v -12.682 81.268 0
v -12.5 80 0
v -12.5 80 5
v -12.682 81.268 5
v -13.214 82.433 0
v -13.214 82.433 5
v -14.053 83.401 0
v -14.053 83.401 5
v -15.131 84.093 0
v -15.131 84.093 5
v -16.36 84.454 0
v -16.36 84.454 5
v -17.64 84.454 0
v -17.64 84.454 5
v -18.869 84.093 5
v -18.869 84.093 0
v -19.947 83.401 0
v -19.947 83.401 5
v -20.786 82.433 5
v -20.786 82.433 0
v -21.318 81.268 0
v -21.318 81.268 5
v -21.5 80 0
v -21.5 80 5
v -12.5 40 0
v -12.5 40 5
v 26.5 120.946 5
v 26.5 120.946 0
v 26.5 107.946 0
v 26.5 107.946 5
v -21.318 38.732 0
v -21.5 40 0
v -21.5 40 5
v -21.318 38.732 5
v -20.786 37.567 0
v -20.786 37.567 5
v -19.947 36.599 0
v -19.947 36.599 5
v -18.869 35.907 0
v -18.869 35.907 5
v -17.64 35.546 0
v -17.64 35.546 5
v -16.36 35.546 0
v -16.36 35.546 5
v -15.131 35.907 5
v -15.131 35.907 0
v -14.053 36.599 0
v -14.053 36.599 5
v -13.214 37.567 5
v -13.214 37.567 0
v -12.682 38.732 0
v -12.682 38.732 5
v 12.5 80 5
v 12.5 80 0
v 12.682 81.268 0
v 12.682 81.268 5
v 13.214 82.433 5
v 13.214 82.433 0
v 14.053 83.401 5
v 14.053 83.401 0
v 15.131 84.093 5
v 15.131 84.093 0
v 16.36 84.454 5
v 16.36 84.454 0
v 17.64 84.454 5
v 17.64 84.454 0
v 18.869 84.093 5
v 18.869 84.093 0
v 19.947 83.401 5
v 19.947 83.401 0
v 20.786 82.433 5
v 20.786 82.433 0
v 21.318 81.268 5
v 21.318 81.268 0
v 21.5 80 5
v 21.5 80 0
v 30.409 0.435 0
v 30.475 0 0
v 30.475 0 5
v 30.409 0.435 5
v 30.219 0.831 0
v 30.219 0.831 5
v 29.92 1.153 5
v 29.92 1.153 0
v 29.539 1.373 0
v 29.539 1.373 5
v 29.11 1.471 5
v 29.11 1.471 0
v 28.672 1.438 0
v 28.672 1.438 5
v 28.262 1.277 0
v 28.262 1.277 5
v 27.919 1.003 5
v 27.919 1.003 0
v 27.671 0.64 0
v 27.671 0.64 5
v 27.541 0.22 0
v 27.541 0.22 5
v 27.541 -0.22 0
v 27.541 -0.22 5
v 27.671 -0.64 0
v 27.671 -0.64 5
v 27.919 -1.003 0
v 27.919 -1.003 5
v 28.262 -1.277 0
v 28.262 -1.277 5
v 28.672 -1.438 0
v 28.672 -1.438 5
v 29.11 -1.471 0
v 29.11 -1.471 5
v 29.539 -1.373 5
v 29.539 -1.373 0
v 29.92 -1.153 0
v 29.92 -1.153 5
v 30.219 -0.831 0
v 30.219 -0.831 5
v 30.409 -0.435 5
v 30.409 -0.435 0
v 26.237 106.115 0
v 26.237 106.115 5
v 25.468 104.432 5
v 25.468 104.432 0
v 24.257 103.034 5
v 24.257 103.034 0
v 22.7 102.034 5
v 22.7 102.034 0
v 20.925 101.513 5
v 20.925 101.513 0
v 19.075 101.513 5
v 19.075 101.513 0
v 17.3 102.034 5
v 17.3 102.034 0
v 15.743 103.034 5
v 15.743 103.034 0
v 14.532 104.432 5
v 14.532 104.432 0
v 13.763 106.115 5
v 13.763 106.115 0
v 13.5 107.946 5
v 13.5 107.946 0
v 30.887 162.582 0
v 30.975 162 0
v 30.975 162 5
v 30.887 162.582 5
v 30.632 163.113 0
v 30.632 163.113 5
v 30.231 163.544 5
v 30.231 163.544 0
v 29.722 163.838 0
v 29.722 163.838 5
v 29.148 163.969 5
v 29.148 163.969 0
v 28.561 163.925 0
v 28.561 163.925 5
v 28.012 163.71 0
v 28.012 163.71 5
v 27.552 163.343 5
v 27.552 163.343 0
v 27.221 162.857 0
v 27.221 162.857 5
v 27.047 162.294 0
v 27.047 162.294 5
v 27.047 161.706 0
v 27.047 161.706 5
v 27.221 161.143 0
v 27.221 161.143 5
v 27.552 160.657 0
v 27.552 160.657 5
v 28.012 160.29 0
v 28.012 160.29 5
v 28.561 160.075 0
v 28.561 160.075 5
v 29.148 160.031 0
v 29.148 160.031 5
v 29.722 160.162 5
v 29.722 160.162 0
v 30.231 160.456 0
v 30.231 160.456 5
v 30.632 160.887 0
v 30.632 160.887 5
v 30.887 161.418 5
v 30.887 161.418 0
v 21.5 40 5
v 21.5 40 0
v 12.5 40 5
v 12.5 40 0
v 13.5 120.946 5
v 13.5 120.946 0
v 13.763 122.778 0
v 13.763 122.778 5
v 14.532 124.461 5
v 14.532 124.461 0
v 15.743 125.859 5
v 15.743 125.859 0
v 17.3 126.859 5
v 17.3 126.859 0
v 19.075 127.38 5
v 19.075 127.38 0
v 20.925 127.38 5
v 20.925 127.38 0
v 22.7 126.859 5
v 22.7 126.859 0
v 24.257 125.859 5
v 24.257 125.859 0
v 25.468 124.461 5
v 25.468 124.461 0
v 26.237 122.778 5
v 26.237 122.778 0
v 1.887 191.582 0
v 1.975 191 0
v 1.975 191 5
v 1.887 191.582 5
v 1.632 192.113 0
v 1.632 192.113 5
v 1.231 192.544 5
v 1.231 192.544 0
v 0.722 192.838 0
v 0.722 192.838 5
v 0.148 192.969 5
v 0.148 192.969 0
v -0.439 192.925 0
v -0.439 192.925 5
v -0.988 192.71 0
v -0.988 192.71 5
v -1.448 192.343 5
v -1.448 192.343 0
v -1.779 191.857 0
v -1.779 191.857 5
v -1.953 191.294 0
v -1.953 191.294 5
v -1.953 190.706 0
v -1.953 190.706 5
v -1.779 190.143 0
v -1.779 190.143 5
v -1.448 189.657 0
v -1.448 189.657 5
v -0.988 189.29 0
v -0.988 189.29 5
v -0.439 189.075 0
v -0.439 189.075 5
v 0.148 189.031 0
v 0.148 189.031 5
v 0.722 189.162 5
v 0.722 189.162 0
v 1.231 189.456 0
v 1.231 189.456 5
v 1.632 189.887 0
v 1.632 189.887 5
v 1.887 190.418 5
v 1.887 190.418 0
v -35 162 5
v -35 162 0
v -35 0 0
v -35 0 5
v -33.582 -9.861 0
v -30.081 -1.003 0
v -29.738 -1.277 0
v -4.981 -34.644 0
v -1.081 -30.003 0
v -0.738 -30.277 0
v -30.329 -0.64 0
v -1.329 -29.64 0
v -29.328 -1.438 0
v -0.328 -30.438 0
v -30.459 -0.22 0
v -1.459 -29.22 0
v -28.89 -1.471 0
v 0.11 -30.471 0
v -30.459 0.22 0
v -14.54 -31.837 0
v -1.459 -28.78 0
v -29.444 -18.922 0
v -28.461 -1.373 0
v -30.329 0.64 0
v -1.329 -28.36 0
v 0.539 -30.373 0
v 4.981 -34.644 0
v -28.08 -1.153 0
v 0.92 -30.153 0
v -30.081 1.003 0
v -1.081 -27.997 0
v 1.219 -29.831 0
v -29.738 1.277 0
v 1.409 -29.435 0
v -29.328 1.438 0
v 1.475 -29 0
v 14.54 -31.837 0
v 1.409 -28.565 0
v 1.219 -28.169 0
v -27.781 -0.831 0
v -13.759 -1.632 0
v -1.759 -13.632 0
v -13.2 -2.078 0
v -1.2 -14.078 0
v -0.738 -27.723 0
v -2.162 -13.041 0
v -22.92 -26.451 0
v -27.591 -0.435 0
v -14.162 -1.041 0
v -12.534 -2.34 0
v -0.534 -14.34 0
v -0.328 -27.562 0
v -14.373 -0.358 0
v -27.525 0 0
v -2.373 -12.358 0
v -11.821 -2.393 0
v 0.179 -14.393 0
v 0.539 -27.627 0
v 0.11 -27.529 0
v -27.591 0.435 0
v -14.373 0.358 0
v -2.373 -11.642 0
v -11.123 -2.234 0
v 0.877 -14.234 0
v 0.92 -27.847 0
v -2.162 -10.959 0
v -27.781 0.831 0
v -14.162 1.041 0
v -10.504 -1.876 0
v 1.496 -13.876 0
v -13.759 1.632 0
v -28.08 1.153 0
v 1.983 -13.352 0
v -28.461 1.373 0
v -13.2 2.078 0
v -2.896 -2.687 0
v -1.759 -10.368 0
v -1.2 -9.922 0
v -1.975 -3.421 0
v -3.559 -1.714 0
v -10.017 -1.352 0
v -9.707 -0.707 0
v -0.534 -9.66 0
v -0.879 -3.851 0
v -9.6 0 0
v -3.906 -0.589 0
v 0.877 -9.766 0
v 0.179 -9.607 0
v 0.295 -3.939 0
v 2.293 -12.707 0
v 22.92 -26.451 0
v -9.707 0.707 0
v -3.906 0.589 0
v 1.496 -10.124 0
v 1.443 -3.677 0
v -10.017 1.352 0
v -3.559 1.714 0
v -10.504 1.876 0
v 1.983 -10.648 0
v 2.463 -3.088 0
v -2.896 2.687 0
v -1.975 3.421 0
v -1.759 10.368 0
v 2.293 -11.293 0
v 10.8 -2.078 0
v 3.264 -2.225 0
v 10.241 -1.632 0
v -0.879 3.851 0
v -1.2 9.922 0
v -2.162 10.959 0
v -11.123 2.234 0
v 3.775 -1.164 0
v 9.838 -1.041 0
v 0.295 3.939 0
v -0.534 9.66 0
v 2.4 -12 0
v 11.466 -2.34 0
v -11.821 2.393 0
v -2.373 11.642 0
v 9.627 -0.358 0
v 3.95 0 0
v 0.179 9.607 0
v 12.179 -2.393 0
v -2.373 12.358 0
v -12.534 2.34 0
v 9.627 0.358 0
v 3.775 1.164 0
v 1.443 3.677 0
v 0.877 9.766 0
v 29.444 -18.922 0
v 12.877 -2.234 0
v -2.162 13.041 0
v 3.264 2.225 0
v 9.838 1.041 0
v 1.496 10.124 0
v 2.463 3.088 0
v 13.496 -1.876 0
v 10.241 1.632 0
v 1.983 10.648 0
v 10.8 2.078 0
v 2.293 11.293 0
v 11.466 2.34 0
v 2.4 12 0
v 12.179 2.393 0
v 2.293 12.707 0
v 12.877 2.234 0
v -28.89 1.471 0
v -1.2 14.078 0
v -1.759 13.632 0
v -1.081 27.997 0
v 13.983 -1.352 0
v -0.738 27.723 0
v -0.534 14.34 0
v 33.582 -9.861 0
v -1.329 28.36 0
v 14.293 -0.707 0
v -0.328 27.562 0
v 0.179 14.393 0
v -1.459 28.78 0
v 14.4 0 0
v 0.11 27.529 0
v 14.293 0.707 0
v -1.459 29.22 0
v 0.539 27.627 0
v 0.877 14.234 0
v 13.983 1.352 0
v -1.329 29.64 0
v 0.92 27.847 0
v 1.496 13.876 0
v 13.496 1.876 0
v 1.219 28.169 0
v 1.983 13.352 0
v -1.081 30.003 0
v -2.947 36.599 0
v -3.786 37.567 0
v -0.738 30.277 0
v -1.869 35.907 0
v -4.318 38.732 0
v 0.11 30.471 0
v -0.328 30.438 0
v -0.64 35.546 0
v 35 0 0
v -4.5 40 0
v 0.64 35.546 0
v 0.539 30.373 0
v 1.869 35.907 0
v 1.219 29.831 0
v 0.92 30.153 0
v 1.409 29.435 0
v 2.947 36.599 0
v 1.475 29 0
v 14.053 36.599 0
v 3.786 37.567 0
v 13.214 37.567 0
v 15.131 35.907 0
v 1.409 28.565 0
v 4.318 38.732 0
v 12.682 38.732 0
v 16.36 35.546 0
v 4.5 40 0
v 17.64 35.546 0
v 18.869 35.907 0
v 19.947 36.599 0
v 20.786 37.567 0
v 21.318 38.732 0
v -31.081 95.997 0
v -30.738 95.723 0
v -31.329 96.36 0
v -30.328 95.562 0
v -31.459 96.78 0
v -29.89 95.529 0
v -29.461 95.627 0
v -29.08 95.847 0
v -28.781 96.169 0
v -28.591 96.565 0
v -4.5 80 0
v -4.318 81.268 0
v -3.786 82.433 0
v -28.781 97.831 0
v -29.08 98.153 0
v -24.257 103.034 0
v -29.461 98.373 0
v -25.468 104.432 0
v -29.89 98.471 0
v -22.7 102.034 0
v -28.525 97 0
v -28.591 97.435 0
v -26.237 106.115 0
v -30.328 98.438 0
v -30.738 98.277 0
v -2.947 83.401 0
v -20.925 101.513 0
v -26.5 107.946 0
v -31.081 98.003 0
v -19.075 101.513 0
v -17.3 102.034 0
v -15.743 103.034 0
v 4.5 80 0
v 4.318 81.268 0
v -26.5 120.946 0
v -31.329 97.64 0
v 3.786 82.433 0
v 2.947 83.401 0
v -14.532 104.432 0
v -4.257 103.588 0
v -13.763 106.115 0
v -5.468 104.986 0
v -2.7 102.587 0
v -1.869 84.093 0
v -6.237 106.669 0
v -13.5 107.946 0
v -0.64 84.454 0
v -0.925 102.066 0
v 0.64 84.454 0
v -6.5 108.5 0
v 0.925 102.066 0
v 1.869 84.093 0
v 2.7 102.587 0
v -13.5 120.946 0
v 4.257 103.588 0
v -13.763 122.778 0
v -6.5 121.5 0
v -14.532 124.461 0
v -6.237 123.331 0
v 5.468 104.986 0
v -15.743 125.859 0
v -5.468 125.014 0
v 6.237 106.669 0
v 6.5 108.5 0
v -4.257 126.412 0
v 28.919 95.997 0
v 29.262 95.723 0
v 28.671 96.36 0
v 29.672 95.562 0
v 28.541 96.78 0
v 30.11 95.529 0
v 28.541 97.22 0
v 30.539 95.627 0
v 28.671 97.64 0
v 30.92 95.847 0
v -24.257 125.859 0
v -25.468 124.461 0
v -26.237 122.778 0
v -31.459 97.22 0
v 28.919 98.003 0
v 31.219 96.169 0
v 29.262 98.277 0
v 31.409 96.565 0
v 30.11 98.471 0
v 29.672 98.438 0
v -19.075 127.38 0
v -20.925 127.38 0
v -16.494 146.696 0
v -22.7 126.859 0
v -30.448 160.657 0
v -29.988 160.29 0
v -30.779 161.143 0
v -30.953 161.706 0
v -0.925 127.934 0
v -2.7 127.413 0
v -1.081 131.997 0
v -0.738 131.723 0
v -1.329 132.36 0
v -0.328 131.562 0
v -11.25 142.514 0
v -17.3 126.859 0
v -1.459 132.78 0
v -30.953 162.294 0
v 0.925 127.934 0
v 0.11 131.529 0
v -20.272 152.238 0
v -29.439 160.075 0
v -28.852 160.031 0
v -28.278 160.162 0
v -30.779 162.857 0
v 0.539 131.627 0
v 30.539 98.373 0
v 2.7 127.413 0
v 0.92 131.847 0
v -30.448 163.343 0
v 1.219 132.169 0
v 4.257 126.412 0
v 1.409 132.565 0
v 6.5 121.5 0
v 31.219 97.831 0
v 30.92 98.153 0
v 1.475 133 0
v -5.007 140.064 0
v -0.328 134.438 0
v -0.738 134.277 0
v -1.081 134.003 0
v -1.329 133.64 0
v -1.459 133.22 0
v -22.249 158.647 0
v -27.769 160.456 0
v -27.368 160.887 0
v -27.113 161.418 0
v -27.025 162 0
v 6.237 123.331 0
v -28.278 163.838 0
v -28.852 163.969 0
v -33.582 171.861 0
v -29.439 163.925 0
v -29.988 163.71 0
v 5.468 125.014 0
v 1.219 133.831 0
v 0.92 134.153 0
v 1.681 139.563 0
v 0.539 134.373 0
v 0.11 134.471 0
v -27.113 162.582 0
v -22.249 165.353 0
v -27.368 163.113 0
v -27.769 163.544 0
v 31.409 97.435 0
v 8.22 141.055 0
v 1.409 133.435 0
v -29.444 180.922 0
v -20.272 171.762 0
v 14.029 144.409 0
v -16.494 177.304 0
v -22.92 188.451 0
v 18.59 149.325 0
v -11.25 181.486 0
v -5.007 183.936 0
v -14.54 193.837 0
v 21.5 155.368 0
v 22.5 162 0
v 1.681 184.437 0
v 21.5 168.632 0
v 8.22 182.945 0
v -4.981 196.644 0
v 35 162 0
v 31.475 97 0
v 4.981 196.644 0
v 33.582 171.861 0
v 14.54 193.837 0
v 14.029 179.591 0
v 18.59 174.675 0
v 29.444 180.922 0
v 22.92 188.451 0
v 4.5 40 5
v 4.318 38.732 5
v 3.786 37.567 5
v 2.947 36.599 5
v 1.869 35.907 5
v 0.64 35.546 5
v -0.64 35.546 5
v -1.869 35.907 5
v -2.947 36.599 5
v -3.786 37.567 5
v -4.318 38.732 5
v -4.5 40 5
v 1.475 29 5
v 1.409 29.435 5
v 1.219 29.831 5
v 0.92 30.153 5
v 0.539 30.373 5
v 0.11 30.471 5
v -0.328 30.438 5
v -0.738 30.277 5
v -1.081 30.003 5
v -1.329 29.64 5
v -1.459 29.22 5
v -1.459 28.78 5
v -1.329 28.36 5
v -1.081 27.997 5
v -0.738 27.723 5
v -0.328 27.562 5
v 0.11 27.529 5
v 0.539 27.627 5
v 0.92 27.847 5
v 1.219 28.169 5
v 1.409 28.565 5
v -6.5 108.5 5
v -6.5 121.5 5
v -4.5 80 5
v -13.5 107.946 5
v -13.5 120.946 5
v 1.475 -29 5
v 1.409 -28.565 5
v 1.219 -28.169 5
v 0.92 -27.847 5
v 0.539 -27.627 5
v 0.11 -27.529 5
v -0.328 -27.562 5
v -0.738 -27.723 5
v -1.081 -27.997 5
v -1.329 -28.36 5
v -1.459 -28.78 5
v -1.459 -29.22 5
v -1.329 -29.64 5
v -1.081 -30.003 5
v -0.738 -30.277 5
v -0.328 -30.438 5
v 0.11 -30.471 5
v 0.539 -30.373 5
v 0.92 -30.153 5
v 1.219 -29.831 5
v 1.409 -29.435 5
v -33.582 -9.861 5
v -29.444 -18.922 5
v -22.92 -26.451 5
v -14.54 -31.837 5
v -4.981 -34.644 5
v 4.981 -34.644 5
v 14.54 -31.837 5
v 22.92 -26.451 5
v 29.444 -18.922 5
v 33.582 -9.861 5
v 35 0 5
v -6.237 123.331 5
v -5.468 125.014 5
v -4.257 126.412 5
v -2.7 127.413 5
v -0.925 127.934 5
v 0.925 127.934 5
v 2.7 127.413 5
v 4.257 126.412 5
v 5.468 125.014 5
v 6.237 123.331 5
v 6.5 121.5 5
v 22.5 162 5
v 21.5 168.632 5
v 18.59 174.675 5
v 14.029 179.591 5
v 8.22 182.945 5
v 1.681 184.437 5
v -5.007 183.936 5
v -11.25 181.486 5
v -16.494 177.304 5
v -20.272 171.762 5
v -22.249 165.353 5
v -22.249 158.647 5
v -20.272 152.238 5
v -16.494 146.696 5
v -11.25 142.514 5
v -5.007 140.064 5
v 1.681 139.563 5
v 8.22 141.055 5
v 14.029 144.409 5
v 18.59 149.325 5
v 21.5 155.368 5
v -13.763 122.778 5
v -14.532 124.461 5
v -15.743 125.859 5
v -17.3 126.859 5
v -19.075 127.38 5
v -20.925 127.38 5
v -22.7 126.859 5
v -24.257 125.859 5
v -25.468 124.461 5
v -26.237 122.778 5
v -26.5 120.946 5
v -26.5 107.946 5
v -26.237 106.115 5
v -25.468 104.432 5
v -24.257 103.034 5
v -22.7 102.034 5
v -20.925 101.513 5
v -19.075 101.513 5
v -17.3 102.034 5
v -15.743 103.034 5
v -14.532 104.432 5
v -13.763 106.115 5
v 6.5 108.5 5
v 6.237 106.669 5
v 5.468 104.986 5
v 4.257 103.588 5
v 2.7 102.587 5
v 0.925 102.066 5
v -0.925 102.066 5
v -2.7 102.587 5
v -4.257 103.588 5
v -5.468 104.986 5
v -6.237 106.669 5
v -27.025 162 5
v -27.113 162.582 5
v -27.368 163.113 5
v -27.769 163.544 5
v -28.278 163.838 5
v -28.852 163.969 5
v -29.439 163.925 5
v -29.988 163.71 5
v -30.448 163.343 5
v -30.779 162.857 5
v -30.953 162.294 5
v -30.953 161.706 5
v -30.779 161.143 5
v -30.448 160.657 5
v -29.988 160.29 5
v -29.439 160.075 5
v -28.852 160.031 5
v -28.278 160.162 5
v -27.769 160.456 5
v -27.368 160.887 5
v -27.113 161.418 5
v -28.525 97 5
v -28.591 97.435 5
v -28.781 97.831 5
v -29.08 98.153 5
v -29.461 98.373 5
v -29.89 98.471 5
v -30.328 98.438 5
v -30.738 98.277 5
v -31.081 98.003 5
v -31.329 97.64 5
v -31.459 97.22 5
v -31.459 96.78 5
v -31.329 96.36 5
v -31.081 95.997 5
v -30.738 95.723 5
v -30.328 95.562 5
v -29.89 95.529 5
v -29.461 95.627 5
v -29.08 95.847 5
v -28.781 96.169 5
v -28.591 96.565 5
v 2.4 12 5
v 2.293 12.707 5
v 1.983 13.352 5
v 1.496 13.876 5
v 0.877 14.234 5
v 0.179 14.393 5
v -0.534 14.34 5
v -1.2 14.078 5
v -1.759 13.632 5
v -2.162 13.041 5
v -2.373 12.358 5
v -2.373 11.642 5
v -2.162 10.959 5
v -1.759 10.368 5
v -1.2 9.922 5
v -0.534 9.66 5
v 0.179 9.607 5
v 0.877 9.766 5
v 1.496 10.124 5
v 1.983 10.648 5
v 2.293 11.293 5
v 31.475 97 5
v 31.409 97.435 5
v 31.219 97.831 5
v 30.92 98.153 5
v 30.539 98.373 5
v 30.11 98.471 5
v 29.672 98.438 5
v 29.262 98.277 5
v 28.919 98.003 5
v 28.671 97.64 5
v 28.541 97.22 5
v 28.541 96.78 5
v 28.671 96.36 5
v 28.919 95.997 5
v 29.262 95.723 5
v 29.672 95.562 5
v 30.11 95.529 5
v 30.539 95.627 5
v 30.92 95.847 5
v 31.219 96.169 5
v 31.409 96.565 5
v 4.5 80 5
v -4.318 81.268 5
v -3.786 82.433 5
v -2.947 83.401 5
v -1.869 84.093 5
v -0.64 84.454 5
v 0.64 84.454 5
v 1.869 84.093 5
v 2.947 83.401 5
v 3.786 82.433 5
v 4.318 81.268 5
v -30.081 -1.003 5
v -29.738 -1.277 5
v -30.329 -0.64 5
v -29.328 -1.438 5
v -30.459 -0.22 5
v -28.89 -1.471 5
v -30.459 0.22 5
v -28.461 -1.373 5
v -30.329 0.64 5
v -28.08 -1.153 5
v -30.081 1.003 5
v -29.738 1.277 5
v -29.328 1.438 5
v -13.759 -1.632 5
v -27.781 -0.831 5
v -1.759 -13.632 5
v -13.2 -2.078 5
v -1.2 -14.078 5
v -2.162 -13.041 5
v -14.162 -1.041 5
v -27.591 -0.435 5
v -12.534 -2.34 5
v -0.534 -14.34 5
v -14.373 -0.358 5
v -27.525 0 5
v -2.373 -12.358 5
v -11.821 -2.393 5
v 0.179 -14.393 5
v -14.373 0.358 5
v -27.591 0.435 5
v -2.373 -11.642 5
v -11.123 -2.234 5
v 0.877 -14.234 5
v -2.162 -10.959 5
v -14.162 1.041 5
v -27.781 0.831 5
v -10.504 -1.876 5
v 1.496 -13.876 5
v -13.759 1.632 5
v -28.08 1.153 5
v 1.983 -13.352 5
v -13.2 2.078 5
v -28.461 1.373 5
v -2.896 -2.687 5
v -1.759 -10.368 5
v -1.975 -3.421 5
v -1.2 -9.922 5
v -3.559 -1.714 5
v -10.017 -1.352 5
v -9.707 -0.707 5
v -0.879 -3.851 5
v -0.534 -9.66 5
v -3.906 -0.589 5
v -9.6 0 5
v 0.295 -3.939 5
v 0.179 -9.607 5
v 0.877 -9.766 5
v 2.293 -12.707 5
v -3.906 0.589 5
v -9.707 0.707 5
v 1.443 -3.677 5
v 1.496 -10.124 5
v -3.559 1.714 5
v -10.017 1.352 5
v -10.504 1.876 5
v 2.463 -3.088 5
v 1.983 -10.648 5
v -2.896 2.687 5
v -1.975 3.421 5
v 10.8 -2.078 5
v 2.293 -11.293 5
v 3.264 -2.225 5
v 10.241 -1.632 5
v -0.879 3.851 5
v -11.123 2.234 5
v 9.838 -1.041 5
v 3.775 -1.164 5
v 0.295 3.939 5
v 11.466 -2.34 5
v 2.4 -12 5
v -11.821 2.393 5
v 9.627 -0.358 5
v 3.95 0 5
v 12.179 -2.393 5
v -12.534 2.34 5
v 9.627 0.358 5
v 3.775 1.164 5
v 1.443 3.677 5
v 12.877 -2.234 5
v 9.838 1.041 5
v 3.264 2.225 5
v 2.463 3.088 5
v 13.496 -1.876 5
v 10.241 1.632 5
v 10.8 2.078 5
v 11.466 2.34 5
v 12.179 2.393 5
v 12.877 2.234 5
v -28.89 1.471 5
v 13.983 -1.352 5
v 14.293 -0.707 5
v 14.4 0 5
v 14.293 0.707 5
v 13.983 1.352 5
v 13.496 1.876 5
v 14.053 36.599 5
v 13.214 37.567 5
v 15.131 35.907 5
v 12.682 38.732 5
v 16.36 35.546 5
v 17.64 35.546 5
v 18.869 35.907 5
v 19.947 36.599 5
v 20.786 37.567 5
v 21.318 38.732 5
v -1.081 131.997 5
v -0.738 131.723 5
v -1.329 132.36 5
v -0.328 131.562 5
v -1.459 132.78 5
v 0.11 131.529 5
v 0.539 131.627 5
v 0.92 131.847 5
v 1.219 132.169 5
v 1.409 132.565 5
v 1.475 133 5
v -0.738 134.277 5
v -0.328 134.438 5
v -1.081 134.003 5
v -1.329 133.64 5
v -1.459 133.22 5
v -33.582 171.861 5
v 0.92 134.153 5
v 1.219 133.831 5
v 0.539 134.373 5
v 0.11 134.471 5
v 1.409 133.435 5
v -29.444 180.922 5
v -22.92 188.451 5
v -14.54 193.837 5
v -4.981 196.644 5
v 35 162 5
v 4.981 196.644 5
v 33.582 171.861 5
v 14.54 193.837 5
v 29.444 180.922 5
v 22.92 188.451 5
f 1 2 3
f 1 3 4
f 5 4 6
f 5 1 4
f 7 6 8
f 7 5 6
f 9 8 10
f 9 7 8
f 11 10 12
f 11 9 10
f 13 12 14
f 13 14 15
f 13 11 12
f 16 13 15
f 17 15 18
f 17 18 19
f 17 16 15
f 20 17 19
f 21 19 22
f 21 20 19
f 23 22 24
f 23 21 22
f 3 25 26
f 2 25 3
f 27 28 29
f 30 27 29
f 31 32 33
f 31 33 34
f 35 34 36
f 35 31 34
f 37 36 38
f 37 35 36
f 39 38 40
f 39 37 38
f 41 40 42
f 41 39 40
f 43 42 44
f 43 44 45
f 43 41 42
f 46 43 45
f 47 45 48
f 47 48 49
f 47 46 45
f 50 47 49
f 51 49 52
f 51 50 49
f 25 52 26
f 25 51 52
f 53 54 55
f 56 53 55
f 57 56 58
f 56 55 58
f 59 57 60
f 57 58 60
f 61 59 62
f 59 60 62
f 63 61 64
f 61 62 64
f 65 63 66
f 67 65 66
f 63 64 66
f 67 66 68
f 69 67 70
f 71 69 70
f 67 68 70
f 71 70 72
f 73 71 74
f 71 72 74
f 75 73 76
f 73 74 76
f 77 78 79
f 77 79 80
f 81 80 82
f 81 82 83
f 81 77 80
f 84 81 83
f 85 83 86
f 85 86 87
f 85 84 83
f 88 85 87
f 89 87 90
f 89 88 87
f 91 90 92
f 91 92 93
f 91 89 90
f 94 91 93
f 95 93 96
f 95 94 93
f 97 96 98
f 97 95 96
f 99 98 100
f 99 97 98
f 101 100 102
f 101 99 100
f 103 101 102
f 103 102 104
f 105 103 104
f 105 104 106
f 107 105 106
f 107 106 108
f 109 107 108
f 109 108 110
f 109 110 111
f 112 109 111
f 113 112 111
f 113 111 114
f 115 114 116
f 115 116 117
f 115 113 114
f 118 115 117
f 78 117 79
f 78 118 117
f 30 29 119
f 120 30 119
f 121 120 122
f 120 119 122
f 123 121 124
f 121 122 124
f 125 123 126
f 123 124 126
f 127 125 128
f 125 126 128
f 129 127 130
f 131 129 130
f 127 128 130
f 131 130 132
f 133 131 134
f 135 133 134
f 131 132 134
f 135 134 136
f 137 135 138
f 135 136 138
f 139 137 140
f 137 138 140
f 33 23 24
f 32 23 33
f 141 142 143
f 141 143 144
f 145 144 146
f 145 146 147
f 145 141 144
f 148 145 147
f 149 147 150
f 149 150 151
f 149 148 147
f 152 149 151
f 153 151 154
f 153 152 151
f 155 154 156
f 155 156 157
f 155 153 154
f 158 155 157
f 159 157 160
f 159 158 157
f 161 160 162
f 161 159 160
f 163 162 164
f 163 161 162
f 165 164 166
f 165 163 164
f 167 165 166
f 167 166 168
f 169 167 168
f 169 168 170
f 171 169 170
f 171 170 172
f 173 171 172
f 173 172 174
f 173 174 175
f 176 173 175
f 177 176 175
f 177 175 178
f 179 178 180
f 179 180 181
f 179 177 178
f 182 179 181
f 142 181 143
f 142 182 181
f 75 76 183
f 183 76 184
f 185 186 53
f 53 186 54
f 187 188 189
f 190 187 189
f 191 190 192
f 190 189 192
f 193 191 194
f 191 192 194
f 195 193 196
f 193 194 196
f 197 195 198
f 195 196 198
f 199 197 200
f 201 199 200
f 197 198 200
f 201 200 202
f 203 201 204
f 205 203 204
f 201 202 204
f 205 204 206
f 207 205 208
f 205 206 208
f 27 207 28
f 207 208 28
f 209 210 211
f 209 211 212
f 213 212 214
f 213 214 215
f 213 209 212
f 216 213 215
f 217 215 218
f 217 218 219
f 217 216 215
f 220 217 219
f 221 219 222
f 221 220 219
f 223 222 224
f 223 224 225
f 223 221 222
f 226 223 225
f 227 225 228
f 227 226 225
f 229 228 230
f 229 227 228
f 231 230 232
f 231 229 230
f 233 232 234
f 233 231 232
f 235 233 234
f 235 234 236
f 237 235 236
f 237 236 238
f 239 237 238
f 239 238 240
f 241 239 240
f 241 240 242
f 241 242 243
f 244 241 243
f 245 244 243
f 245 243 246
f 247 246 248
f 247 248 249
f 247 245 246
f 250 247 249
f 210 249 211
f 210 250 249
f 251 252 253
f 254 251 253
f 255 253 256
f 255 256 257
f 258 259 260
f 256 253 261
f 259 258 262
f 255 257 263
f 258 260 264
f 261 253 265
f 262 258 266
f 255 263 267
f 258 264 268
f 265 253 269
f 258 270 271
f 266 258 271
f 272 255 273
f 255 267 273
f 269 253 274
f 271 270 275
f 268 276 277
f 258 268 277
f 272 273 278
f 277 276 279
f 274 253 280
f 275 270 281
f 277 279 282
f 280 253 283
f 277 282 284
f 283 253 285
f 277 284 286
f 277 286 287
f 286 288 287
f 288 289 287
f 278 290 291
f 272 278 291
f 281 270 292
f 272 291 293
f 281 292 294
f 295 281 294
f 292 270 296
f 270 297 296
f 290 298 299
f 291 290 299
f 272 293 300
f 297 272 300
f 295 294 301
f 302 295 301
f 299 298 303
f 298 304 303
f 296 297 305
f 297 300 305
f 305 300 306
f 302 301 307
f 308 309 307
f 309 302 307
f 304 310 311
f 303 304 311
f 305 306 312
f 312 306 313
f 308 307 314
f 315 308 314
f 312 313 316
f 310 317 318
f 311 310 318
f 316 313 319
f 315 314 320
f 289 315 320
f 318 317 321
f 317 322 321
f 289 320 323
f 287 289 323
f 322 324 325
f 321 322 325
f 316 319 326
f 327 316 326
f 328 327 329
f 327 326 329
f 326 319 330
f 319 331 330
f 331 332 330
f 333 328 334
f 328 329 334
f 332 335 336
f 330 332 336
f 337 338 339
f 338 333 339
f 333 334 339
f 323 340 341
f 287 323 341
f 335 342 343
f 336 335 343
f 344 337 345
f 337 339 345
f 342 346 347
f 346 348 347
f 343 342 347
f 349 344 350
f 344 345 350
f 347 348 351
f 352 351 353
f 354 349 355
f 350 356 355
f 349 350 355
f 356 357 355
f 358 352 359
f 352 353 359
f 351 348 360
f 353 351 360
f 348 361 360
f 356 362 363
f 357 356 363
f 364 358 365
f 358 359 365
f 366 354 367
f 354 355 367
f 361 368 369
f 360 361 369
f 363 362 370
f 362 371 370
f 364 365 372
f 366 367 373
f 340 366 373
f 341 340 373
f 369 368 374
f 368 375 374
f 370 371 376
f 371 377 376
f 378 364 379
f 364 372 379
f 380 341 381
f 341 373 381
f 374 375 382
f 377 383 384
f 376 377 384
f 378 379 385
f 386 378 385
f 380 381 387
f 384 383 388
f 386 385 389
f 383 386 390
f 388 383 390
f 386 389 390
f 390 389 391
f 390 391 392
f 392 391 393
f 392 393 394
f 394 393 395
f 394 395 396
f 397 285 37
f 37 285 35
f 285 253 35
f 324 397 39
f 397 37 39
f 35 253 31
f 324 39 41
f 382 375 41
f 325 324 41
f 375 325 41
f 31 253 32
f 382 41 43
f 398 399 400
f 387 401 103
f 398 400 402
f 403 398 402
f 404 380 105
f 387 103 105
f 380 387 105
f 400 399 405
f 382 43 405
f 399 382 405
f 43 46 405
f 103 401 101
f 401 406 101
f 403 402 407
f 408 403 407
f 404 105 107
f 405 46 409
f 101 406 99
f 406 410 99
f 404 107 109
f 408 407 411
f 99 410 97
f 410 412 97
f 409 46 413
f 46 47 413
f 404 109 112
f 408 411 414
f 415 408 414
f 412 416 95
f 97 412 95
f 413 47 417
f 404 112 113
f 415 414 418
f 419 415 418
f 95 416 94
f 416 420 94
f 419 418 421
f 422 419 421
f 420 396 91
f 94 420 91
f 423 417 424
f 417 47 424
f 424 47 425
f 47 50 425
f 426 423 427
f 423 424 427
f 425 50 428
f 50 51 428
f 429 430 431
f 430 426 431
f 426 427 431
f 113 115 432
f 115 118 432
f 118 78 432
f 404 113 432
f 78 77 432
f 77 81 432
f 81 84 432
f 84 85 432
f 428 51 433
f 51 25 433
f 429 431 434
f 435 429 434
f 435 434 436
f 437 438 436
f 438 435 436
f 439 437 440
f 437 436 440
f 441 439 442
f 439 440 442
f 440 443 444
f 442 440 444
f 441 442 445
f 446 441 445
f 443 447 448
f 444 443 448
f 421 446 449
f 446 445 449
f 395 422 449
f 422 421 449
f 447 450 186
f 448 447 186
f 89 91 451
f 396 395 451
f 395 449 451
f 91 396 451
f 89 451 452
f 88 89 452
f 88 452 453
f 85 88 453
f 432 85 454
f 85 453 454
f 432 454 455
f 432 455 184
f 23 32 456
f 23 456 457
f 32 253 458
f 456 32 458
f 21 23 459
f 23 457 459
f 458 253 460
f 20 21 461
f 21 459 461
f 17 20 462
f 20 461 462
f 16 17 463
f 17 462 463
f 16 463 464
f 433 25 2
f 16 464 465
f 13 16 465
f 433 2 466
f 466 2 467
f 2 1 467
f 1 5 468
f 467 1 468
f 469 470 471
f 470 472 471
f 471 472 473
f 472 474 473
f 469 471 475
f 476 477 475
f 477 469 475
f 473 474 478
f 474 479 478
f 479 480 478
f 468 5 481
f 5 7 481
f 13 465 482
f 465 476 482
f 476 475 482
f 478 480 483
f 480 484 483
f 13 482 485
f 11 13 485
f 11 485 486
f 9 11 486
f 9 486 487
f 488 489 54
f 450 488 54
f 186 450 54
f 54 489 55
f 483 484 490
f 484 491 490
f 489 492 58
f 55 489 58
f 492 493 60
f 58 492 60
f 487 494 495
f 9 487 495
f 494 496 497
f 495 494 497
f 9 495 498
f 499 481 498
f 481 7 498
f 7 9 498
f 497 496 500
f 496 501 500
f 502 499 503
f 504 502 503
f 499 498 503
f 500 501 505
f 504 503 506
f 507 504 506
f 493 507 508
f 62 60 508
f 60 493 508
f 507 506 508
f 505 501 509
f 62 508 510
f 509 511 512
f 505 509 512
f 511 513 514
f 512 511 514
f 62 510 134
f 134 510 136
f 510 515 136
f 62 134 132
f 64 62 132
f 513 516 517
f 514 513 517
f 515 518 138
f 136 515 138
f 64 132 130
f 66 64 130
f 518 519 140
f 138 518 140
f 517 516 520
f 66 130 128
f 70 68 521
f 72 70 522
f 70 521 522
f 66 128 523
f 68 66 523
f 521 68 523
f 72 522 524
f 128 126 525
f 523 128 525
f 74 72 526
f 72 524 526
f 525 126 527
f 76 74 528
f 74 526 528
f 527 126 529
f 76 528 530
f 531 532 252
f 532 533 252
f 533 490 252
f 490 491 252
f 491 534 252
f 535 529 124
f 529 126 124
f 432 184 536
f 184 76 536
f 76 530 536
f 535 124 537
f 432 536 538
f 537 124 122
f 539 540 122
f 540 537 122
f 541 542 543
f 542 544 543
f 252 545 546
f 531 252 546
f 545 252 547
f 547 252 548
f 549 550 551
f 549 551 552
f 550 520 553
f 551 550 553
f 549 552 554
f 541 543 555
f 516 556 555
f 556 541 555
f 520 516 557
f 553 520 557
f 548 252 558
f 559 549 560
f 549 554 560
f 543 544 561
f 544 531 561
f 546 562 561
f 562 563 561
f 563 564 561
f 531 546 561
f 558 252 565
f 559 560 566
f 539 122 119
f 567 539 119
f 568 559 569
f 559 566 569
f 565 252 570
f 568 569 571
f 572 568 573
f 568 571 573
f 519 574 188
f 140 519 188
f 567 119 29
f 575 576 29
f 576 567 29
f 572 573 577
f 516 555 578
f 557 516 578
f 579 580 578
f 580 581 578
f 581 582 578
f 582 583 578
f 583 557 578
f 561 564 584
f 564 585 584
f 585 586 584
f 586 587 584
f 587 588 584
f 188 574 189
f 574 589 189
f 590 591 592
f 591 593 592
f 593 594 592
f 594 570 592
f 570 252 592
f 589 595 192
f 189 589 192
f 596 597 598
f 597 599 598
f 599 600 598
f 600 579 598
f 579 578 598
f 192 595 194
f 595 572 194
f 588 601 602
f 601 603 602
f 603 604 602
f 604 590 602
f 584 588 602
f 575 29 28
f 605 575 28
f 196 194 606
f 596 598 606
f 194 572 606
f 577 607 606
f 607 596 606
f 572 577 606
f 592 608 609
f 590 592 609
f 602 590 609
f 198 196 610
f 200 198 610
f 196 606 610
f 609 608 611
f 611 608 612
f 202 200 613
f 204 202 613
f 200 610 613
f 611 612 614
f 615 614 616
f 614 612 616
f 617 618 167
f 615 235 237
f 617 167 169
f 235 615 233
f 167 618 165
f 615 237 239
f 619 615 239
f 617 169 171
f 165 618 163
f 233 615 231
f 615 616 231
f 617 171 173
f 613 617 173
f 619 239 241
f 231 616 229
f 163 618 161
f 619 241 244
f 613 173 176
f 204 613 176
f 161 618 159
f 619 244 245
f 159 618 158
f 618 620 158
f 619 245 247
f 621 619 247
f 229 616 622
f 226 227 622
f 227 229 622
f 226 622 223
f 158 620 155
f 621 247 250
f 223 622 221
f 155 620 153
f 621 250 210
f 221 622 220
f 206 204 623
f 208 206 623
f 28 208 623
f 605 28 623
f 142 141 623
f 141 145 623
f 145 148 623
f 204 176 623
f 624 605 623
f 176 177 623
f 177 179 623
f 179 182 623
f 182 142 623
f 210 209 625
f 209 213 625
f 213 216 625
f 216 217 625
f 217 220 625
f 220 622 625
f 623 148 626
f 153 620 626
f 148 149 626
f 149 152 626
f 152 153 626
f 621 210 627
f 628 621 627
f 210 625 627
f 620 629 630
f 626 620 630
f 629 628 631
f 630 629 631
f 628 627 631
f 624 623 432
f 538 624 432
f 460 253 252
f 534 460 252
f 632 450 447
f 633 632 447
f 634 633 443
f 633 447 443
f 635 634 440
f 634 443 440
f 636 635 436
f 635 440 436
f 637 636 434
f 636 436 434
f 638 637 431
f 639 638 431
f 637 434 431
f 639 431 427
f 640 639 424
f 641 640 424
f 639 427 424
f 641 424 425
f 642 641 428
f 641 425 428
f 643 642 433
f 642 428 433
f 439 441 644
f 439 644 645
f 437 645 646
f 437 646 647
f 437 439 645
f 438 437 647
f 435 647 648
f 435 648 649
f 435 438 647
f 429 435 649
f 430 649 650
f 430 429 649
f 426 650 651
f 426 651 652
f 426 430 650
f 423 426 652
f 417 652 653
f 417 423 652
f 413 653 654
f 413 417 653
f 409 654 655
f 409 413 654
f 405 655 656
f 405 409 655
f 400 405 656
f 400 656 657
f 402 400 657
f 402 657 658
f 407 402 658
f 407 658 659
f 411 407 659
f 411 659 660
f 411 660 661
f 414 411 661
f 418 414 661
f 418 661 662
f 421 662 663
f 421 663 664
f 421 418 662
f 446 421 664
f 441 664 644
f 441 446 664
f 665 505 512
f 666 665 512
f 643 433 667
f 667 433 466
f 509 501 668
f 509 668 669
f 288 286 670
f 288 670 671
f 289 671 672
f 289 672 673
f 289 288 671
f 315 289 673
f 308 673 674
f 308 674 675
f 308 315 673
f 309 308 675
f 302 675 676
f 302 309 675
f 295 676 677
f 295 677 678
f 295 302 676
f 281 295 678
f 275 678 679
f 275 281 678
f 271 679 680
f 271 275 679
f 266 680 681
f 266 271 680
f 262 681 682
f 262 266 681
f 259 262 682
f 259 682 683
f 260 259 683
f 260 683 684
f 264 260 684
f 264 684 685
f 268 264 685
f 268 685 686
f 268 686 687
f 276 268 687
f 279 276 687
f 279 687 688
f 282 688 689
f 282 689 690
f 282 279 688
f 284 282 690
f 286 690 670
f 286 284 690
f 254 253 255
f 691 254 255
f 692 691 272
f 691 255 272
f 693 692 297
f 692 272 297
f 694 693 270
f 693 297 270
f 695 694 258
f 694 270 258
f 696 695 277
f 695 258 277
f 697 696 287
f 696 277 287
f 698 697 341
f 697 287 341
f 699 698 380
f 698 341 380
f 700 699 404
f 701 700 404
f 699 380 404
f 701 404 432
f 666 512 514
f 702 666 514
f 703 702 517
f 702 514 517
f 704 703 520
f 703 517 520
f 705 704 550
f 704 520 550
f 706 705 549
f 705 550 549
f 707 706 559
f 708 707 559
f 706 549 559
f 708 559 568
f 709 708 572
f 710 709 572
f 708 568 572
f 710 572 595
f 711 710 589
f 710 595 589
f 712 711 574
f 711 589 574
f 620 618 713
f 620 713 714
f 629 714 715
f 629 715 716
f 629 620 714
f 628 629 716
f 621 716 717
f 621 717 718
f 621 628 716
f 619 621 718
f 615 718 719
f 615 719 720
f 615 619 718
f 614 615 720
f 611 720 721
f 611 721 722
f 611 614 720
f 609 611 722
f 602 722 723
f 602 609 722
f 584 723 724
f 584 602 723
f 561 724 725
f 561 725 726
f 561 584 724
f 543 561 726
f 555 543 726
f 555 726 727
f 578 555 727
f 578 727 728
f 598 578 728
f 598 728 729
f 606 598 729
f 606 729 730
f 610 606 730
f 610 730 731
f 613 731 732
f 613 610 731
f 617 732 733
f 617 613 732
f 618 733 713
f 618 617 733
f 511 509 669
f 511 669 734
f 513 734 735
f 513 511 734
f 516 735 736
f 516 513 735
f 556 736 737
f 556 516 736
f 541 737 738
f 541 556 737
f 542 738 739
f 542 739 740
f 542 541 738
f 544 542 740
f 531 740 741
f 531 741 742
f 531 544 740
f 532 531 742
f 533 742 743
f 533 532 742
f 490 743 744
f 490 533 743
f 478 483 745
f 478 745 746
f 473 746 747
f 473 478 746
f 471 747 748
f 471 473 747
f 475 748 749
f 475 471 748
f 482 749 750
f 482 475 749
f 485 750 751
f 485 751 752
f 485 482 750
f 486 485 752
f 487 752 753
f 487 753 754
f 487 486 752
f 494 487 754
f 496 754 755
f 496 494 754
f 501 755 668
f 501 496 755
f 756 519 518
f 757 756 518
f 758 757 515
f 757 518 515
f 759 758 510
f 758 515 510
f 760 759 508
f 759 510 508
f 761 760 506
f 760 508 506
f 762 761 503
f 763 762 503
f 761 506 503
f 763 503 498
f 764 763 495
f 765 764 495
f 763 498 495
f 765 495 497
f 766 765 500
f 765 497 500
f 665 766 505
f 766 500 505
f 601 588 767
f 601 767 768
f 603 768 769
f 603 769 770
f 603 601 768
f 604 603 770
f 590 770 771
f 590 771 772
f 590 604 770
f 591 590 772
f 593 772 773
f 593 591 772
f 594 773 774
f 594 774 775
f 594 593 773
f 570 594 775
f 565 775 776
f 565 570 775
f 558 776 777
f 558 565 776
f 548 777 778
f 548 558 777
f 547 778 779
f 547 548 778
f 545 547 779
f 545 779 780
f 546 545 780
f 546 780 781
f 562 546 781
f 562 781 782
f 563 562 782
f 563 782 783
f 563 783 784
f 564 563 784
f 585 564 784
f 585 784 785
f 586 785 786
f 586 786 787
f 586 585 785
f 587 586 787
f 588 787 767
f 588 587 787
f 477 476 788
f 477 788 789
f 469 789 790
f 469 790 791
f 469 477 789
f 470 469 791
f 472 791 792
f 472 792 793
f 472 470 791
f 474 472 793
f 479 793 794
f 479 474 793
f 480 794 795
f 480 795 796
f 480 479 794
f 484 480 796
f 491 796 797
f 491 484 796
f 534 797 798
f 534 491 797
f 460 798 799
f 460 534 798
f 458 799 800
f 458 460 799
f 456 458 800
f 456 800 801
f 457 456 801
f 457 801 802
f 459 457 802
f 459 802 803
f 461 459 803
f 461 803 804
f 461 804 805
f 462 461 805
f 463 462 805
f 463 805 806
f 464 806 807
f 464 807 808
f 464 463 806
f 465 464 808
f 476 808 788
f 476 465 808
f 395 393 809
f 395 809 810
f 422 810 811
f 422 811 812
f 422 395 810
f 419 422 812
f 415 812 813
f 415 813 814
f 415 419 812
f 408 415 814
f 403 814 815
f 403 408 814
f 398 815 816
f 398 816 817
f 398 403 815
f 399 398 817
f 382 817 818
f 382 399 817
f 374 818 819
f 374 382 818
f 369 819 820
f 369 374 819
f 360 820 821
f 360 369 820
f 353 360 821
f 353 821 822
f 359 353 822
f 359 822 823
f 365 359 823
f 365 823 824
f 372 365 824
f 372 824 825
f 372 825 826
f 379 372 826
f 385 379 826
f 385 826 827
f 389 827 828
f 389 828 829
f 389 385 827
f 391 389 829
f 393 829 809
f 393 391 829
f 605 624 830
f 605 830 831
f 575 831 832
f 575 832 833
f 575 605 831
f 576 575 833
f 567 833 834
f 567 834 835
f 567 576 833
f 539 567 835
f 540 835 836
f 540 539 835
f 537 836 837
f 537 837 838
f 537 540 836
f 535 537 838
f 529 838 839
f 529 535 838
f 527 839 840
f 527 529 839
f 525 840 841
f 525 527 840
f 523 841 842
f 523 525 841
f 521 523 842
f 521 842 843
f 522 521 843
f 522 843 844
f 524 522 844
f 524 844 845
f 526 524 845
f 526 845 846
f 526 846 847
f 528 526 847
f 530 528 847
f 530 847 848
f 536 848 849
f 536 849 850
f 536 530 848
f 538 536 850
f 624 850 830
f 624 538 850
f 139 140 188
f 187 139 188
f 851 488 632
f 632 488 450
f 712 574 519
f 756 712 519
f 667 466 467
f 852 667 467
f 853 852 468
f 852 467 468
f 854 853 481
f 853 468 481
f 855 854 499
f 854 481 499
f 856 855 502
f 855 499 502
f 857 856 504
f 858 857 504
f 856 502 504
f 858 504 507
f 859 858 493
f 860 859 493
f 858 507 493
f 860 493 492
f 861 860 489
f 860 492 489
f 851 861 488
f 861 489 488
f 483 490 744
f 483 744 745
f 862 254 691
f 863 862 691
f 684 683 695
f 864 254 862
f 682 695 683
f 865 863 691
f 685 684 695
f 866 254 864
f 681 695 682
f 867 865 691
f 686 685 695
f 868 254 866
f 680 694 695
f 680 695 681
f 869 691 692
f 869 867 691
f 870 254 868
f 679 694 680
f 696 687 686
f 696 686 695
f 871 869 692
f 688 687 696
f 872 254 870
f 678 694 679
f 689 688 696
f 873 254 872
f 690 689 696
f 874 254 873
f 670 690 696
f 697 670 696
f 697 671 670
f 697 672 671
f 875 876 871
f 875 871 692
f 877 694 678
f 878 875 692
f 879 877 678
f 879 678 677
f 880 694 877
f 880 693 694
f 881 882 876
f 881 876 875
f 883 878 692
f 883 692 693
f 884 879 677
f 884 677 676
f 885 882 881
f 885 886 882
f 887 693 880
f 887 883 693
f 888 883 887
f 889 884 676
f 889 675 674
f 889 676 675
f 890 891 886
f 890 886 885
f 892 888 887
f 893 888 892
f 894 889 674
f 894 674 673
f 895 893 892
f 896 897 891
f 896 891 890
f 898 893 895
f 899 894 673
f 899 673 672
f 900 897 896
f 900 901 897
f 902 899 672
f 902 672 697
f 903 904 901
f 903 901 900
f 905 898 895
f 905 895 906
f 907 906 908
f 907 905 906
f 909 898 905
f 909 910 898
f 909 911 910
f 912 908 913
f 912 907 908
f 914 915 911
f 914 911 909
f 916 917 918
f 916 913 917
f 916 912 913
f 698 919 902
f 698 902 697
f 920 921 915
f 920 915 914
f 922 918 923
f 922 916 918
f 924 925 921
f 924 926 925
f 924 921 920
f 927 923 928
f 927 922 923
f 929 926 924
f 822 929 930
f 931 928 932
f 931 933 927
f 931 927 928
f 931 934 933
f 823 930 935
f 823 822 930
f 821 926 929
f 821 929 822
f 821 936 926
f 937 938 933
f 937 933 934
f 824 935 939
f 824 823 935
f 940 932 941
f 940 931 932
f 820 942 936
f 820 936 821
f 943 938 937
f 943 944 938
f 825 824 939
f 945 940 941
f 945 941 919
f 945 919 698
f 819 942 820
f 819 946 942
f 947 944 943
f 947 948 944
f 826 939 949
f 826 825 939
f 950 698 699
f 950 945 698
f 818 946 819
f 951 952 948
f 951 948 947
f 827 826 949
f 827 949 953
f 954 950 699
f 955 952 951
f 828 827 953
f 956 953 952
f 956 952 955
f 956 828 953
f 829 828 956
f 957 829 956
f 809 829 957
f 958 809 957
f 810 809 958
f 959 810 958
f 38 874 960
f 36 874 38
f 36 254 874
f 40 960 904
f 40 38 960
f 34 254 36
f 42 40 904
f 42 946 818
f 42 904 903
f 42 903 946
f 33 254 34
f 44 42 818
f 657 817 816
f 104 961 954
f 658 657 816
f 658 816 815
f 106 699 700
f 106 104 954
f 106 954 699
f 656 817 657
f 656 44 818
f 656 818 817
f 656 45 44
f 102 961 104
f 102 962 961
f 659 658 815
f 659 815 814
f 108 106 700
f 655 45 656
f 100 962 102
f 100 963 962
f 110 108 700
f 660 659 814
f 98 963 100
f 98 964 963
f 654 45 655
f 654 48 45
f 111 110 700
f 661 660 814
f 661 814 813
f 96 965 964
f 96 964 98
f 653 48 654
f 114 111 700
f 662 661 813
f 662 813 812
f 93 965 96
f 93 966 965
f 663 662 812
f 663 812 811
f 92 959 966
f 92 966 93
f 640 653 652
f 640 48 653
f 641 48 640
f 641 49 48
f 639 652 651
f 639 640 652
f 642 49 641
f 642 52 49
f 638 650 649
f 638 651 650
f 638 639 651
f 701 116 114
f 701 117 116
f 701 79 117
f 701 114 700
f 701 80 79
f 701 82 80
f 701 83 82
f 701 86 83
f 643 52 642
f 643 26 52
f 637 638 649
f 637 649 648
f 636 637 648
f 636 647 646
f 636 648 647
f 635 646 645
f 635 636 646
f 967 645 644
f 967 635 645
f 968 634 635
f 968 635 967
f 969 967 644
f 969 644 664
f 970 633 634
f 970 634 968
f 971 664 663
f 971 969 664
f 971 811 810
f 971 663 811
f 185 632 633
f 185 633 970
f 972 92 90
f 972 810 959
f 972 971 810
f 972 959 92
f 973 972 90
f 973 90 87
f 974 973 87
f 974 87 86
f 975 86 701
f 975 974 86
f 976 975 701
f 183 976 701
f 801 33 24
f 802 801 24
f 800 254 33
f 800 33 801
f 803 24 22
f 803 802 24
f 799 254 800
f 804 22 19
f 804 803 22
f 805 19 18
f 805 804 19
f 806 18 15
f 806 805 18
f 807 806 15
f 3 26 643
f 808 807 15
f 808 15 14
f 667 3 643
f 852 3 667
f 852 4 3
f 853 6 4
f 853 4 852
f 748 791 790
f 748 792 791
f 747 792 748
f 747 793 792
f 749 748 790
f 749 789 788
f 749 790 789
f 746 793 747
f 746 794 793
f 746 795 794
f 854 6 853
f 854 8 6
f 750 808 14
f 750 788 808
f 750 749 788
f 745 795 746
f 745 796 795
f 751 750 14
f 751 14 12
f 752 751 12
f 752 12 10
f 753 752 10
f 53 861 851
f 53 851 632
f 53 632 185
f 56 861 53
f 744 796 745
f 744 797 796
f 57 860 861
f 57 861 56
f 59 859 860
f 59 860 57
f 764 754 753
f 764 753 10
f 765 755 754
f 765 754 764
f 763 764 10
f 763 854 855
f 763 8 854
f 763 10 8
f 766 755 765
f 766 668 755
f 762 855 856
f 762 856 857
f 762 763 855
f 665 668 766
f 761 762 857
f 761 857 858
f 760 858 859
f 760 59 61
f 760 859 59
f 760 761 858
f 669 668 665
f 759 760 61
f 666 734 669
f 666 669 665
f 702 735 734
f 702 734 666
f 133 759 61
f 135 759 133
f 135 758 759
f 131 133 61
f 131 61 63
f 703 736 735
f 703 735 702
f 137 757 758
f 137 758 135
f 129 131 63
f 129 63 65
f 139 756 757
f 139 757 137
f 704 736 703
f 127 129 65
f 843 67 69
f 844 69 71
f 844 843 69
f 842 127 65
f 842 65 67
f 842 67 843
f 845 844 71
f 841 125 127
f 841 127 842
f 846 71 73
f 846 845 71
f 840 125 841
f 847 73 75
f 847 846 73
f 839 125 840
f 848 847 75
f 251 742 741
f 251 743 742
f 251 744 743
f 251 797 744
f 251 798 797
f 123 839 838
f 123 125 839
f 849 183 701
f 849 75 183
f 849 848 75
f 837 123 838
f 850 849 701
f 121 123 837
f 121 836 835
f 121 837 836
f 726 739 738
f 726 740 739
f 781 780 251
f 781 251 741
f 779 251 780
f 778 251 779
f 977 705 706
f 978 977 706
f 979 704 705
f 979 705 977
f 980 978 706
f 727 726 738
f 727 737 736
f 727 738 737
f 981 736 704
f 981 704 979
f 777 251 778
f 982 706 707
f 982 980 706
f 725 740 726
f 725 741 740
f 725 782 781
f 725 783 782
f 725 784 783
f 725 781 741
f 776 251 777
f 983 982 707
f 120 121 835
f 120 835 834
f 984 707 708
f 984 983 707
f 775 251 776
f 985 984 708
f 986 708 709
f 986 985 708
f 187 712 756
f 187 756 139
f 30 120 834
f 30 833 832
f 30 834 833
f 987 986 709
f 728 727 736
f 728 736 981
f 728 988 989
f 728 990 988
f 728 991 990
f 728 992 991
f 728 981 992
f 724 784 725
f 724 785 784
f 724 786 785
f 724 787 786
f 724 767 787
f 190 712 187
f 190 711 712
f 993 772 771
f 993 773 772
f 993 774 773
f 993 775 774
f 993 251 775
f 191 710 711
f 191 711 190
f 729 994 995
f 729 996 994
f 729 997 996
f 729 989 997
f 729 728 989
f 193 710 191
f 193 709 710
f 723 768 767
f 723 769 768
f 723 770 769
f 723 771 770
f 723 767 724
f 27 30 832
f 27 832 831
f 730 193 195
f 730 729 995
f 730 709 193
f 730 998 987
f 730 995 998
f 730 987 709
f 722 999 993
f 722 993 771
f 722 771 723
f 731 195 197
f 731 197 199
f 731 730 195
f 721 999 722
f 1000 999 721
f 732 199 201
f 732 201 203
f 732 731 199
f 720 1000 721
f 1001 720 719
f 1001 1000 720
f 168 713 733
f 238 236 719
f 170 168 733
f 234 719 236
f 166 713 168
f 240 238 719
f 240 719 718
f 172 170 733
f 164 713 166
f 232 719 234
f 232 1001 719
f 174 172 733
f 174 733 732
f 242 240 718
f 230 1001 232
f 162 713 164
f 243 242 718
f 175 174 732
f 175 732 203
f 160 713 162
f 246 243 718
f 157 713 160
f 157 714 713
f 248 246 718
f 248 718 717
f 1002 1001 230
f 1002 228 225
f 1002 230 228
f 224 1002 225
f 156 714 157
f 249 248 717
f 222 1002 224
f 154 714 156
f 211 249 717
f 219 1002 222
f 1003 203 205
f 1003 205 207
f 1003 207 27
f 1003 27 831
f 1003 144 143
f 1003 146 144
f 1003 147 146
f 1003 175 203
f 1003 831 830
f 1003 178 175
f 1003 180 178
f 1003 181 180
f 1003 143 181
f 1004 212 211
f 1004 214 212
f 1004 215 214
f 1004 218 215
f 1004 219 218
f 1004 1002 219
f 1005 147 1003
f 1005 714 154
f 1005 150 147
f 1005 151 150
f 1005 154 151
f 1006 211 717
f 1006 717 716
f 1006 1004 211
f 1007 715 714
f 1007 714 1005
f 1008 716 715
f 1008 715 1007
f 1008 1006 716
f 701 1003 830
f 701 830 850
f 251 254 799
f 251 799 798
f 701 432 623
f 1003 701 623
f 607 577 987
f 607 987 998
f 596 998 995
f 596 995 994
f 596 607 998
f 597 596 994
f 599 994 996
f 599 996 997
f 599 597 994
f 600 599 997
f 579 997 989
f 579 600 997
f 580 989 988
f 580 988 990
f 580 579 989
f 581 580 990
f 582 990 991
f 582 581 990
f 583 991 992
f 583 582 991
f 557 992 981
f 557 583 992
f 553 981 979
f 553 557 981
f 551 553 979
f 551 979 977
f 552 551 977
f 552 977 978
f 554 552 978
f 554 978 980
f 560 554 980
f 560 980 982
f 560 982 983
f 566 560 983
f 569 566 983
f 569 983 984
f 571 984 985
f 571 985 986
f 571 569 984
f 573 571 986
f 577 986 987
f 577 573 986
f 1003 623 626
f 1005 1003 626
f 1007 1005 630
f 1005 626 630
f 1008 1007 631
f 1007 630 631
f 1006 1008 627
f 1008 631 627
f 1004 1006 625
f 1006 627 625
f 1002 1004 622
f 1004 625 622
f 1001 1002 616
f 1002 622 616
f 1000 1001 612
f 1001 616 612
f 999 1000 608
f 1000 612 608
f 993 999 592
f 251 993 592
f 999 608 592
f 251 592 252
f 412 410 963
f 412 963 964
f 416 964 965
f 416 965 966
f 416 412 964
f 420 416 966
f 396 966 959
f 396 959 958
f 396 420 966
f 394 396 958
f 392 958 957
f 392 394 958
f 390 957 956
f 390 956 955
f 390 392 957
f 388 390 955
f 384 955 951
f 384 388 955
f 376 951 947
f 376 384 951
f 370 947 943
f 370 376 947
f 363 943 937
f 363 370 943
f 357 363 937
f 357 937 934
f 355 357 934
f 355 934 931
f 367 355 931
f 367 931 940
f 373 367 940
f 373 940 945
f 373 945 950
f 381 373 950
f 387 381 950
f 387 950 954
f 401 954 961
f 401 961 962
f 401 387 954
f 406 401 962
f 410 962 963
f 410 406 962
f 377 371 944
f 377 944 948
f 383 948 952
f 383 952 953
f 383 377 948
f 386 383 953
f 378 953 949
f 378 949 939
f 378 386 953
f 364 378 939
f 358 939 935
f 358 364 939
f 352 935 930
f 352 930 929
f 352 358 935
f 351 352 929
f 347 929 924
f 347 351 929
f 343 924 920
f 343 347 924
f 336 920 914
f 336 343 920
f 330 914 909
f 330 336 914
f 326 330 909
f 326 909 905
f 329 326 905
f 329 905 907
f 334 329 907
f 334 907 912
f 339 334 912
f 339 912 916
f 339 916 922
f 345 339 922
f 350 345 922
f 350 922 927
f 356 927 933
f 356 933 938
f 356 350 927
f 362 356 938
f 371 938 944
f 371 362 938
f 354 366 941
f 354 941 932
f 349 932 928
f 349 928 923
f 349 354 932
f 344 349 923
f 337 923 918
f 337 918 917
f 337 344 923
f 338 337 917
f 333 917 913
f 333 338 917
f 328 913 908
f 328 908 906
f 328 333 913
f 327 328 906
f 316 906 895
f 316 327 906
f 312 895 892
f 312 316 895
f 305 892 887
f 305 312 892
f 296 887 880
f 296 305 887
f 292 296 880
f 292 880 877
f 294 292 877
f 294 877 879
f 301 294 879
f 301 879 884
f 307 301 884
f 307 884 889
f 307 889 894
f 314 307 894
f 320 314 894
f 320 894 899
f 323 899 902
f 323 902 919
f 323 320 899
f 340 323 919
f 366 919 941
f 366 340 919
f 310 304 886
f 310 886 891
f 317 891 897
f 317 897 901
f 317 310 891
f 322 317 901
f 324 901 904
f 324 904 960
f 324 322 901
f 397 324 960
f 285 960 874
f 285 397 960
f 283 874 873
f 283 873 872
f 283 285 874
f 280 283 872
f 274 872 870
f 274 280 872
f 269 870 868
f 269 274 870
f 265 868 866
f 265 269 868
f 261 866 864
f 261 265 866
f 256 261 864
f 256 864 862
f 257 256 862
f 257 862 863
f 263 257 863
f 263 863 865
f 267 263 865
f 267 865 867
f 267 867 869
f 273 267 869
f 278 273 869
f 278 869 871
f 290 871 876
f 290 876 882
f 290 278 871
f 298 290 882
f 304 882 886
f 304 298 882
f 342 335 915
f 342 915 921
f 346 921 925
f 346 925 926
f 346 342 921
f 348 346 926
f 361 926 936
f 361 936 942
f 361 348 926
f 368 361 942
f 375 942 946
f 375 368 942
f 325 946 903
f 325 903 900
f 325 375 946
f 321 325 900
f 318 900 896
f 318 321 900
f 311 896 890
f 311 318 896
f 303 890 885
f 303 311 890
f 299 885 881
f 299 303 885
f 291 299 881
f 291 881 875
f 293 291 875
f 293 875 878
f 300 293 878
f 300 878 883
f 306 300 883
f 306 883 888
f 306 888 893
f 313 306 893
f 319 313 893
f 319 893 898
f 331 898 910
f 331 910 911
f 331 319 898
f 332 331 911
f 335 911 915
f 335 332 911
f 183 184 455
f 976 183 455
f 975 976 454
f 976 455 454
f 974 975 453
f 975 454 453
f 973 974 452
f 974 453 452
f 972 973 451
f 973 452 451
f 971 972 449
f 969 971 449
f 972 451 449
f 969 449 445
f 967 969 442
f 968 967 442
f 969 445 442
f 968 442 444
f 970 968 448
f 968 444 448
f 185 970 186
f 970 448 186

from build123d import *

# Parameters (mm, degrees)
SKETCH1_R           = 3.95
SKETCH1_R_2         = 1.475
SKETCH1_R_3         = 22.5
SKETCH1_R_4         = 2.4
SKETCH1_R_5         = 1.975
BOSS_EXTRUDE1_DEPTH = 5


with BuildPart() as part:
    # Sketch1 → Boss-Extrude1 (new body)
    with BuildSketch(Plane.XY):
        with BuildLine():
            Line((35, 0), (35, 162))
            ThreePointArc((35, 162), (0, 197), (-35, 162))
            Line((-35, 162), (-35, 0))
            ThreePointArc((-35, 0), (0, -35), (35, 0))
        make_face()
        Circle(SKETCH1_R, mode=Mode.SUBTRACT)
        with Locations((0, 29)):
            Circle(SKETCH1_R_2, mode=Mode.SUBTRACT)
        with Locations((0, 162)):
            Circle(SKETCH1_R_3, mode=Mode.SUBTRACT)
        with Locations((0, 133)):
            Circle(SKETCH1_R_2, mode=Mode.SUBTRACT)
        with Locations((-30, 97)):
            Circle(SKETCH1_R_2, mode=Mode.SUBTRACT)
        with Locations((30, 97)):
            Circle(SKETCH1_R_2, mode=Mode.SUBTRACT)
        with Locations((29, 0)):
            Circle(SKETCH1_R_2, mode=Mode.SUBTRACT)
        with Locations((0, -29)):
            Circle(SKETCH1_R_2, mode=Mode.SUBTRACT)
        with Locations((-29, 0)):
            Circle(SKETCH1_R_2, mode=Mode.SUBTRACT)
        with Locations((0, 12)):
            Circle(SKETCH1_R_4, mode=Mode.SUBTRACT)
        with Locations((12, 0)):
            Circle(SKETCH1_R_4, mode=Mode.SUBTRACT)
        with Locations((0, -12)):
            Circle(SKETCH1_R_4, mode=Mode.SUBTRACT)
        with Locations((-12, 0)):
            Circle(SKETCH1_R_4, mode=Mode.SUBTRACT)
        with Locations((0, 191)):
            Circle(SKETCH1_R_5, mode=Mode.SUBTRACT)
        with Locations((29, 162)):
            Circle(SKETCH1_R_5, mode=Mode.SUBTRACT)
        with Locations((-29, 162)):
            Circle(SKETCH1_R_5, mode=Mode.SUBTRACT)
        with BuildLine():
            Line((4.5, 80), (4.5, 40))
            ThreePointArc((4.5, 40), (0, 35.5), (-4.5, 40))
            Line((-4.5, 40), (-4.5, 80))
            ThreePointArc((-4.5, 80), (0, 84.5), (4.5, 80))
        make_face(mode=Mode.SUBTRACT)
        with BuildLine():
            Line((21.5, 80), (21.5, 40))
            ThreePointArc((21.5, 40), (17, 35.5), (12.5, 40))
            Line((12.5, 40), (12.5, 80))
            ThreePointArc((12.5, 80), (17, 84.5), (21.5, 80))
        make_face(mode=Mode.SUBTRACT)
        with BuildLine():
            Line((-21.5, 80), (-21.5, 40))
            ThreePointArc((-21.5, 40), (-17, 35.5), (-12.5, 40))
            Line((-12.5, 40), (-12.5, 80))
            ThreePointArc((-12.5, 80), (-17, 84.5), (-21.5, 80))
        make_face(mode=Mode.SUBTRACT)
        with BuildLine():
            Line((6.5, 121.5), (6.5, 108.5))
            ThreePointArc((6.5, 108.5), (0, 102), (-6.5, 108.5))
            Line((-6.5, 108.5), (-6.5, 121.5))
            ThreePointArc((-6.5, 121.5), (0, 128), (6.5, 121.5))
        make_face(mode=Mode.SUBTRACT)
        with BuildLine():
            Line((26.5, 120.946496324), (26.5, 107.946496324))
            ThreePointArc((26.5, 107.946496324), (20, 101.446496324), (13.5, 107.946496324))
            Line((13.5, 107.946496324), (13.5, 120.946496324))
            ThreePointArc((13.5, 120.946496324), (20, 127.446496324), (26.5, 120.946496324))
        make_face(mode=Mode.SUBTRACT)
        with BuildLine():
            Line((-26.5, 120.946496324), (-26.5, 107.946496324))
            ThreePointArc((-26.5, 107.946496324), (-20, 101.446496324), (-13.5, 107.946496324))
            Line((-13.5, 107.946496324), (-13.5, 120.946496324))
            ThreePointArc((-13.5, 120.946496324), (-20, 127.446496324), (-26.5, 120.946496324))
        make_face(mode=Mode.SUBTRACT)
    extrude(amount=BOSS_EXTRUDE1_DEPTH)


solid = part.part
